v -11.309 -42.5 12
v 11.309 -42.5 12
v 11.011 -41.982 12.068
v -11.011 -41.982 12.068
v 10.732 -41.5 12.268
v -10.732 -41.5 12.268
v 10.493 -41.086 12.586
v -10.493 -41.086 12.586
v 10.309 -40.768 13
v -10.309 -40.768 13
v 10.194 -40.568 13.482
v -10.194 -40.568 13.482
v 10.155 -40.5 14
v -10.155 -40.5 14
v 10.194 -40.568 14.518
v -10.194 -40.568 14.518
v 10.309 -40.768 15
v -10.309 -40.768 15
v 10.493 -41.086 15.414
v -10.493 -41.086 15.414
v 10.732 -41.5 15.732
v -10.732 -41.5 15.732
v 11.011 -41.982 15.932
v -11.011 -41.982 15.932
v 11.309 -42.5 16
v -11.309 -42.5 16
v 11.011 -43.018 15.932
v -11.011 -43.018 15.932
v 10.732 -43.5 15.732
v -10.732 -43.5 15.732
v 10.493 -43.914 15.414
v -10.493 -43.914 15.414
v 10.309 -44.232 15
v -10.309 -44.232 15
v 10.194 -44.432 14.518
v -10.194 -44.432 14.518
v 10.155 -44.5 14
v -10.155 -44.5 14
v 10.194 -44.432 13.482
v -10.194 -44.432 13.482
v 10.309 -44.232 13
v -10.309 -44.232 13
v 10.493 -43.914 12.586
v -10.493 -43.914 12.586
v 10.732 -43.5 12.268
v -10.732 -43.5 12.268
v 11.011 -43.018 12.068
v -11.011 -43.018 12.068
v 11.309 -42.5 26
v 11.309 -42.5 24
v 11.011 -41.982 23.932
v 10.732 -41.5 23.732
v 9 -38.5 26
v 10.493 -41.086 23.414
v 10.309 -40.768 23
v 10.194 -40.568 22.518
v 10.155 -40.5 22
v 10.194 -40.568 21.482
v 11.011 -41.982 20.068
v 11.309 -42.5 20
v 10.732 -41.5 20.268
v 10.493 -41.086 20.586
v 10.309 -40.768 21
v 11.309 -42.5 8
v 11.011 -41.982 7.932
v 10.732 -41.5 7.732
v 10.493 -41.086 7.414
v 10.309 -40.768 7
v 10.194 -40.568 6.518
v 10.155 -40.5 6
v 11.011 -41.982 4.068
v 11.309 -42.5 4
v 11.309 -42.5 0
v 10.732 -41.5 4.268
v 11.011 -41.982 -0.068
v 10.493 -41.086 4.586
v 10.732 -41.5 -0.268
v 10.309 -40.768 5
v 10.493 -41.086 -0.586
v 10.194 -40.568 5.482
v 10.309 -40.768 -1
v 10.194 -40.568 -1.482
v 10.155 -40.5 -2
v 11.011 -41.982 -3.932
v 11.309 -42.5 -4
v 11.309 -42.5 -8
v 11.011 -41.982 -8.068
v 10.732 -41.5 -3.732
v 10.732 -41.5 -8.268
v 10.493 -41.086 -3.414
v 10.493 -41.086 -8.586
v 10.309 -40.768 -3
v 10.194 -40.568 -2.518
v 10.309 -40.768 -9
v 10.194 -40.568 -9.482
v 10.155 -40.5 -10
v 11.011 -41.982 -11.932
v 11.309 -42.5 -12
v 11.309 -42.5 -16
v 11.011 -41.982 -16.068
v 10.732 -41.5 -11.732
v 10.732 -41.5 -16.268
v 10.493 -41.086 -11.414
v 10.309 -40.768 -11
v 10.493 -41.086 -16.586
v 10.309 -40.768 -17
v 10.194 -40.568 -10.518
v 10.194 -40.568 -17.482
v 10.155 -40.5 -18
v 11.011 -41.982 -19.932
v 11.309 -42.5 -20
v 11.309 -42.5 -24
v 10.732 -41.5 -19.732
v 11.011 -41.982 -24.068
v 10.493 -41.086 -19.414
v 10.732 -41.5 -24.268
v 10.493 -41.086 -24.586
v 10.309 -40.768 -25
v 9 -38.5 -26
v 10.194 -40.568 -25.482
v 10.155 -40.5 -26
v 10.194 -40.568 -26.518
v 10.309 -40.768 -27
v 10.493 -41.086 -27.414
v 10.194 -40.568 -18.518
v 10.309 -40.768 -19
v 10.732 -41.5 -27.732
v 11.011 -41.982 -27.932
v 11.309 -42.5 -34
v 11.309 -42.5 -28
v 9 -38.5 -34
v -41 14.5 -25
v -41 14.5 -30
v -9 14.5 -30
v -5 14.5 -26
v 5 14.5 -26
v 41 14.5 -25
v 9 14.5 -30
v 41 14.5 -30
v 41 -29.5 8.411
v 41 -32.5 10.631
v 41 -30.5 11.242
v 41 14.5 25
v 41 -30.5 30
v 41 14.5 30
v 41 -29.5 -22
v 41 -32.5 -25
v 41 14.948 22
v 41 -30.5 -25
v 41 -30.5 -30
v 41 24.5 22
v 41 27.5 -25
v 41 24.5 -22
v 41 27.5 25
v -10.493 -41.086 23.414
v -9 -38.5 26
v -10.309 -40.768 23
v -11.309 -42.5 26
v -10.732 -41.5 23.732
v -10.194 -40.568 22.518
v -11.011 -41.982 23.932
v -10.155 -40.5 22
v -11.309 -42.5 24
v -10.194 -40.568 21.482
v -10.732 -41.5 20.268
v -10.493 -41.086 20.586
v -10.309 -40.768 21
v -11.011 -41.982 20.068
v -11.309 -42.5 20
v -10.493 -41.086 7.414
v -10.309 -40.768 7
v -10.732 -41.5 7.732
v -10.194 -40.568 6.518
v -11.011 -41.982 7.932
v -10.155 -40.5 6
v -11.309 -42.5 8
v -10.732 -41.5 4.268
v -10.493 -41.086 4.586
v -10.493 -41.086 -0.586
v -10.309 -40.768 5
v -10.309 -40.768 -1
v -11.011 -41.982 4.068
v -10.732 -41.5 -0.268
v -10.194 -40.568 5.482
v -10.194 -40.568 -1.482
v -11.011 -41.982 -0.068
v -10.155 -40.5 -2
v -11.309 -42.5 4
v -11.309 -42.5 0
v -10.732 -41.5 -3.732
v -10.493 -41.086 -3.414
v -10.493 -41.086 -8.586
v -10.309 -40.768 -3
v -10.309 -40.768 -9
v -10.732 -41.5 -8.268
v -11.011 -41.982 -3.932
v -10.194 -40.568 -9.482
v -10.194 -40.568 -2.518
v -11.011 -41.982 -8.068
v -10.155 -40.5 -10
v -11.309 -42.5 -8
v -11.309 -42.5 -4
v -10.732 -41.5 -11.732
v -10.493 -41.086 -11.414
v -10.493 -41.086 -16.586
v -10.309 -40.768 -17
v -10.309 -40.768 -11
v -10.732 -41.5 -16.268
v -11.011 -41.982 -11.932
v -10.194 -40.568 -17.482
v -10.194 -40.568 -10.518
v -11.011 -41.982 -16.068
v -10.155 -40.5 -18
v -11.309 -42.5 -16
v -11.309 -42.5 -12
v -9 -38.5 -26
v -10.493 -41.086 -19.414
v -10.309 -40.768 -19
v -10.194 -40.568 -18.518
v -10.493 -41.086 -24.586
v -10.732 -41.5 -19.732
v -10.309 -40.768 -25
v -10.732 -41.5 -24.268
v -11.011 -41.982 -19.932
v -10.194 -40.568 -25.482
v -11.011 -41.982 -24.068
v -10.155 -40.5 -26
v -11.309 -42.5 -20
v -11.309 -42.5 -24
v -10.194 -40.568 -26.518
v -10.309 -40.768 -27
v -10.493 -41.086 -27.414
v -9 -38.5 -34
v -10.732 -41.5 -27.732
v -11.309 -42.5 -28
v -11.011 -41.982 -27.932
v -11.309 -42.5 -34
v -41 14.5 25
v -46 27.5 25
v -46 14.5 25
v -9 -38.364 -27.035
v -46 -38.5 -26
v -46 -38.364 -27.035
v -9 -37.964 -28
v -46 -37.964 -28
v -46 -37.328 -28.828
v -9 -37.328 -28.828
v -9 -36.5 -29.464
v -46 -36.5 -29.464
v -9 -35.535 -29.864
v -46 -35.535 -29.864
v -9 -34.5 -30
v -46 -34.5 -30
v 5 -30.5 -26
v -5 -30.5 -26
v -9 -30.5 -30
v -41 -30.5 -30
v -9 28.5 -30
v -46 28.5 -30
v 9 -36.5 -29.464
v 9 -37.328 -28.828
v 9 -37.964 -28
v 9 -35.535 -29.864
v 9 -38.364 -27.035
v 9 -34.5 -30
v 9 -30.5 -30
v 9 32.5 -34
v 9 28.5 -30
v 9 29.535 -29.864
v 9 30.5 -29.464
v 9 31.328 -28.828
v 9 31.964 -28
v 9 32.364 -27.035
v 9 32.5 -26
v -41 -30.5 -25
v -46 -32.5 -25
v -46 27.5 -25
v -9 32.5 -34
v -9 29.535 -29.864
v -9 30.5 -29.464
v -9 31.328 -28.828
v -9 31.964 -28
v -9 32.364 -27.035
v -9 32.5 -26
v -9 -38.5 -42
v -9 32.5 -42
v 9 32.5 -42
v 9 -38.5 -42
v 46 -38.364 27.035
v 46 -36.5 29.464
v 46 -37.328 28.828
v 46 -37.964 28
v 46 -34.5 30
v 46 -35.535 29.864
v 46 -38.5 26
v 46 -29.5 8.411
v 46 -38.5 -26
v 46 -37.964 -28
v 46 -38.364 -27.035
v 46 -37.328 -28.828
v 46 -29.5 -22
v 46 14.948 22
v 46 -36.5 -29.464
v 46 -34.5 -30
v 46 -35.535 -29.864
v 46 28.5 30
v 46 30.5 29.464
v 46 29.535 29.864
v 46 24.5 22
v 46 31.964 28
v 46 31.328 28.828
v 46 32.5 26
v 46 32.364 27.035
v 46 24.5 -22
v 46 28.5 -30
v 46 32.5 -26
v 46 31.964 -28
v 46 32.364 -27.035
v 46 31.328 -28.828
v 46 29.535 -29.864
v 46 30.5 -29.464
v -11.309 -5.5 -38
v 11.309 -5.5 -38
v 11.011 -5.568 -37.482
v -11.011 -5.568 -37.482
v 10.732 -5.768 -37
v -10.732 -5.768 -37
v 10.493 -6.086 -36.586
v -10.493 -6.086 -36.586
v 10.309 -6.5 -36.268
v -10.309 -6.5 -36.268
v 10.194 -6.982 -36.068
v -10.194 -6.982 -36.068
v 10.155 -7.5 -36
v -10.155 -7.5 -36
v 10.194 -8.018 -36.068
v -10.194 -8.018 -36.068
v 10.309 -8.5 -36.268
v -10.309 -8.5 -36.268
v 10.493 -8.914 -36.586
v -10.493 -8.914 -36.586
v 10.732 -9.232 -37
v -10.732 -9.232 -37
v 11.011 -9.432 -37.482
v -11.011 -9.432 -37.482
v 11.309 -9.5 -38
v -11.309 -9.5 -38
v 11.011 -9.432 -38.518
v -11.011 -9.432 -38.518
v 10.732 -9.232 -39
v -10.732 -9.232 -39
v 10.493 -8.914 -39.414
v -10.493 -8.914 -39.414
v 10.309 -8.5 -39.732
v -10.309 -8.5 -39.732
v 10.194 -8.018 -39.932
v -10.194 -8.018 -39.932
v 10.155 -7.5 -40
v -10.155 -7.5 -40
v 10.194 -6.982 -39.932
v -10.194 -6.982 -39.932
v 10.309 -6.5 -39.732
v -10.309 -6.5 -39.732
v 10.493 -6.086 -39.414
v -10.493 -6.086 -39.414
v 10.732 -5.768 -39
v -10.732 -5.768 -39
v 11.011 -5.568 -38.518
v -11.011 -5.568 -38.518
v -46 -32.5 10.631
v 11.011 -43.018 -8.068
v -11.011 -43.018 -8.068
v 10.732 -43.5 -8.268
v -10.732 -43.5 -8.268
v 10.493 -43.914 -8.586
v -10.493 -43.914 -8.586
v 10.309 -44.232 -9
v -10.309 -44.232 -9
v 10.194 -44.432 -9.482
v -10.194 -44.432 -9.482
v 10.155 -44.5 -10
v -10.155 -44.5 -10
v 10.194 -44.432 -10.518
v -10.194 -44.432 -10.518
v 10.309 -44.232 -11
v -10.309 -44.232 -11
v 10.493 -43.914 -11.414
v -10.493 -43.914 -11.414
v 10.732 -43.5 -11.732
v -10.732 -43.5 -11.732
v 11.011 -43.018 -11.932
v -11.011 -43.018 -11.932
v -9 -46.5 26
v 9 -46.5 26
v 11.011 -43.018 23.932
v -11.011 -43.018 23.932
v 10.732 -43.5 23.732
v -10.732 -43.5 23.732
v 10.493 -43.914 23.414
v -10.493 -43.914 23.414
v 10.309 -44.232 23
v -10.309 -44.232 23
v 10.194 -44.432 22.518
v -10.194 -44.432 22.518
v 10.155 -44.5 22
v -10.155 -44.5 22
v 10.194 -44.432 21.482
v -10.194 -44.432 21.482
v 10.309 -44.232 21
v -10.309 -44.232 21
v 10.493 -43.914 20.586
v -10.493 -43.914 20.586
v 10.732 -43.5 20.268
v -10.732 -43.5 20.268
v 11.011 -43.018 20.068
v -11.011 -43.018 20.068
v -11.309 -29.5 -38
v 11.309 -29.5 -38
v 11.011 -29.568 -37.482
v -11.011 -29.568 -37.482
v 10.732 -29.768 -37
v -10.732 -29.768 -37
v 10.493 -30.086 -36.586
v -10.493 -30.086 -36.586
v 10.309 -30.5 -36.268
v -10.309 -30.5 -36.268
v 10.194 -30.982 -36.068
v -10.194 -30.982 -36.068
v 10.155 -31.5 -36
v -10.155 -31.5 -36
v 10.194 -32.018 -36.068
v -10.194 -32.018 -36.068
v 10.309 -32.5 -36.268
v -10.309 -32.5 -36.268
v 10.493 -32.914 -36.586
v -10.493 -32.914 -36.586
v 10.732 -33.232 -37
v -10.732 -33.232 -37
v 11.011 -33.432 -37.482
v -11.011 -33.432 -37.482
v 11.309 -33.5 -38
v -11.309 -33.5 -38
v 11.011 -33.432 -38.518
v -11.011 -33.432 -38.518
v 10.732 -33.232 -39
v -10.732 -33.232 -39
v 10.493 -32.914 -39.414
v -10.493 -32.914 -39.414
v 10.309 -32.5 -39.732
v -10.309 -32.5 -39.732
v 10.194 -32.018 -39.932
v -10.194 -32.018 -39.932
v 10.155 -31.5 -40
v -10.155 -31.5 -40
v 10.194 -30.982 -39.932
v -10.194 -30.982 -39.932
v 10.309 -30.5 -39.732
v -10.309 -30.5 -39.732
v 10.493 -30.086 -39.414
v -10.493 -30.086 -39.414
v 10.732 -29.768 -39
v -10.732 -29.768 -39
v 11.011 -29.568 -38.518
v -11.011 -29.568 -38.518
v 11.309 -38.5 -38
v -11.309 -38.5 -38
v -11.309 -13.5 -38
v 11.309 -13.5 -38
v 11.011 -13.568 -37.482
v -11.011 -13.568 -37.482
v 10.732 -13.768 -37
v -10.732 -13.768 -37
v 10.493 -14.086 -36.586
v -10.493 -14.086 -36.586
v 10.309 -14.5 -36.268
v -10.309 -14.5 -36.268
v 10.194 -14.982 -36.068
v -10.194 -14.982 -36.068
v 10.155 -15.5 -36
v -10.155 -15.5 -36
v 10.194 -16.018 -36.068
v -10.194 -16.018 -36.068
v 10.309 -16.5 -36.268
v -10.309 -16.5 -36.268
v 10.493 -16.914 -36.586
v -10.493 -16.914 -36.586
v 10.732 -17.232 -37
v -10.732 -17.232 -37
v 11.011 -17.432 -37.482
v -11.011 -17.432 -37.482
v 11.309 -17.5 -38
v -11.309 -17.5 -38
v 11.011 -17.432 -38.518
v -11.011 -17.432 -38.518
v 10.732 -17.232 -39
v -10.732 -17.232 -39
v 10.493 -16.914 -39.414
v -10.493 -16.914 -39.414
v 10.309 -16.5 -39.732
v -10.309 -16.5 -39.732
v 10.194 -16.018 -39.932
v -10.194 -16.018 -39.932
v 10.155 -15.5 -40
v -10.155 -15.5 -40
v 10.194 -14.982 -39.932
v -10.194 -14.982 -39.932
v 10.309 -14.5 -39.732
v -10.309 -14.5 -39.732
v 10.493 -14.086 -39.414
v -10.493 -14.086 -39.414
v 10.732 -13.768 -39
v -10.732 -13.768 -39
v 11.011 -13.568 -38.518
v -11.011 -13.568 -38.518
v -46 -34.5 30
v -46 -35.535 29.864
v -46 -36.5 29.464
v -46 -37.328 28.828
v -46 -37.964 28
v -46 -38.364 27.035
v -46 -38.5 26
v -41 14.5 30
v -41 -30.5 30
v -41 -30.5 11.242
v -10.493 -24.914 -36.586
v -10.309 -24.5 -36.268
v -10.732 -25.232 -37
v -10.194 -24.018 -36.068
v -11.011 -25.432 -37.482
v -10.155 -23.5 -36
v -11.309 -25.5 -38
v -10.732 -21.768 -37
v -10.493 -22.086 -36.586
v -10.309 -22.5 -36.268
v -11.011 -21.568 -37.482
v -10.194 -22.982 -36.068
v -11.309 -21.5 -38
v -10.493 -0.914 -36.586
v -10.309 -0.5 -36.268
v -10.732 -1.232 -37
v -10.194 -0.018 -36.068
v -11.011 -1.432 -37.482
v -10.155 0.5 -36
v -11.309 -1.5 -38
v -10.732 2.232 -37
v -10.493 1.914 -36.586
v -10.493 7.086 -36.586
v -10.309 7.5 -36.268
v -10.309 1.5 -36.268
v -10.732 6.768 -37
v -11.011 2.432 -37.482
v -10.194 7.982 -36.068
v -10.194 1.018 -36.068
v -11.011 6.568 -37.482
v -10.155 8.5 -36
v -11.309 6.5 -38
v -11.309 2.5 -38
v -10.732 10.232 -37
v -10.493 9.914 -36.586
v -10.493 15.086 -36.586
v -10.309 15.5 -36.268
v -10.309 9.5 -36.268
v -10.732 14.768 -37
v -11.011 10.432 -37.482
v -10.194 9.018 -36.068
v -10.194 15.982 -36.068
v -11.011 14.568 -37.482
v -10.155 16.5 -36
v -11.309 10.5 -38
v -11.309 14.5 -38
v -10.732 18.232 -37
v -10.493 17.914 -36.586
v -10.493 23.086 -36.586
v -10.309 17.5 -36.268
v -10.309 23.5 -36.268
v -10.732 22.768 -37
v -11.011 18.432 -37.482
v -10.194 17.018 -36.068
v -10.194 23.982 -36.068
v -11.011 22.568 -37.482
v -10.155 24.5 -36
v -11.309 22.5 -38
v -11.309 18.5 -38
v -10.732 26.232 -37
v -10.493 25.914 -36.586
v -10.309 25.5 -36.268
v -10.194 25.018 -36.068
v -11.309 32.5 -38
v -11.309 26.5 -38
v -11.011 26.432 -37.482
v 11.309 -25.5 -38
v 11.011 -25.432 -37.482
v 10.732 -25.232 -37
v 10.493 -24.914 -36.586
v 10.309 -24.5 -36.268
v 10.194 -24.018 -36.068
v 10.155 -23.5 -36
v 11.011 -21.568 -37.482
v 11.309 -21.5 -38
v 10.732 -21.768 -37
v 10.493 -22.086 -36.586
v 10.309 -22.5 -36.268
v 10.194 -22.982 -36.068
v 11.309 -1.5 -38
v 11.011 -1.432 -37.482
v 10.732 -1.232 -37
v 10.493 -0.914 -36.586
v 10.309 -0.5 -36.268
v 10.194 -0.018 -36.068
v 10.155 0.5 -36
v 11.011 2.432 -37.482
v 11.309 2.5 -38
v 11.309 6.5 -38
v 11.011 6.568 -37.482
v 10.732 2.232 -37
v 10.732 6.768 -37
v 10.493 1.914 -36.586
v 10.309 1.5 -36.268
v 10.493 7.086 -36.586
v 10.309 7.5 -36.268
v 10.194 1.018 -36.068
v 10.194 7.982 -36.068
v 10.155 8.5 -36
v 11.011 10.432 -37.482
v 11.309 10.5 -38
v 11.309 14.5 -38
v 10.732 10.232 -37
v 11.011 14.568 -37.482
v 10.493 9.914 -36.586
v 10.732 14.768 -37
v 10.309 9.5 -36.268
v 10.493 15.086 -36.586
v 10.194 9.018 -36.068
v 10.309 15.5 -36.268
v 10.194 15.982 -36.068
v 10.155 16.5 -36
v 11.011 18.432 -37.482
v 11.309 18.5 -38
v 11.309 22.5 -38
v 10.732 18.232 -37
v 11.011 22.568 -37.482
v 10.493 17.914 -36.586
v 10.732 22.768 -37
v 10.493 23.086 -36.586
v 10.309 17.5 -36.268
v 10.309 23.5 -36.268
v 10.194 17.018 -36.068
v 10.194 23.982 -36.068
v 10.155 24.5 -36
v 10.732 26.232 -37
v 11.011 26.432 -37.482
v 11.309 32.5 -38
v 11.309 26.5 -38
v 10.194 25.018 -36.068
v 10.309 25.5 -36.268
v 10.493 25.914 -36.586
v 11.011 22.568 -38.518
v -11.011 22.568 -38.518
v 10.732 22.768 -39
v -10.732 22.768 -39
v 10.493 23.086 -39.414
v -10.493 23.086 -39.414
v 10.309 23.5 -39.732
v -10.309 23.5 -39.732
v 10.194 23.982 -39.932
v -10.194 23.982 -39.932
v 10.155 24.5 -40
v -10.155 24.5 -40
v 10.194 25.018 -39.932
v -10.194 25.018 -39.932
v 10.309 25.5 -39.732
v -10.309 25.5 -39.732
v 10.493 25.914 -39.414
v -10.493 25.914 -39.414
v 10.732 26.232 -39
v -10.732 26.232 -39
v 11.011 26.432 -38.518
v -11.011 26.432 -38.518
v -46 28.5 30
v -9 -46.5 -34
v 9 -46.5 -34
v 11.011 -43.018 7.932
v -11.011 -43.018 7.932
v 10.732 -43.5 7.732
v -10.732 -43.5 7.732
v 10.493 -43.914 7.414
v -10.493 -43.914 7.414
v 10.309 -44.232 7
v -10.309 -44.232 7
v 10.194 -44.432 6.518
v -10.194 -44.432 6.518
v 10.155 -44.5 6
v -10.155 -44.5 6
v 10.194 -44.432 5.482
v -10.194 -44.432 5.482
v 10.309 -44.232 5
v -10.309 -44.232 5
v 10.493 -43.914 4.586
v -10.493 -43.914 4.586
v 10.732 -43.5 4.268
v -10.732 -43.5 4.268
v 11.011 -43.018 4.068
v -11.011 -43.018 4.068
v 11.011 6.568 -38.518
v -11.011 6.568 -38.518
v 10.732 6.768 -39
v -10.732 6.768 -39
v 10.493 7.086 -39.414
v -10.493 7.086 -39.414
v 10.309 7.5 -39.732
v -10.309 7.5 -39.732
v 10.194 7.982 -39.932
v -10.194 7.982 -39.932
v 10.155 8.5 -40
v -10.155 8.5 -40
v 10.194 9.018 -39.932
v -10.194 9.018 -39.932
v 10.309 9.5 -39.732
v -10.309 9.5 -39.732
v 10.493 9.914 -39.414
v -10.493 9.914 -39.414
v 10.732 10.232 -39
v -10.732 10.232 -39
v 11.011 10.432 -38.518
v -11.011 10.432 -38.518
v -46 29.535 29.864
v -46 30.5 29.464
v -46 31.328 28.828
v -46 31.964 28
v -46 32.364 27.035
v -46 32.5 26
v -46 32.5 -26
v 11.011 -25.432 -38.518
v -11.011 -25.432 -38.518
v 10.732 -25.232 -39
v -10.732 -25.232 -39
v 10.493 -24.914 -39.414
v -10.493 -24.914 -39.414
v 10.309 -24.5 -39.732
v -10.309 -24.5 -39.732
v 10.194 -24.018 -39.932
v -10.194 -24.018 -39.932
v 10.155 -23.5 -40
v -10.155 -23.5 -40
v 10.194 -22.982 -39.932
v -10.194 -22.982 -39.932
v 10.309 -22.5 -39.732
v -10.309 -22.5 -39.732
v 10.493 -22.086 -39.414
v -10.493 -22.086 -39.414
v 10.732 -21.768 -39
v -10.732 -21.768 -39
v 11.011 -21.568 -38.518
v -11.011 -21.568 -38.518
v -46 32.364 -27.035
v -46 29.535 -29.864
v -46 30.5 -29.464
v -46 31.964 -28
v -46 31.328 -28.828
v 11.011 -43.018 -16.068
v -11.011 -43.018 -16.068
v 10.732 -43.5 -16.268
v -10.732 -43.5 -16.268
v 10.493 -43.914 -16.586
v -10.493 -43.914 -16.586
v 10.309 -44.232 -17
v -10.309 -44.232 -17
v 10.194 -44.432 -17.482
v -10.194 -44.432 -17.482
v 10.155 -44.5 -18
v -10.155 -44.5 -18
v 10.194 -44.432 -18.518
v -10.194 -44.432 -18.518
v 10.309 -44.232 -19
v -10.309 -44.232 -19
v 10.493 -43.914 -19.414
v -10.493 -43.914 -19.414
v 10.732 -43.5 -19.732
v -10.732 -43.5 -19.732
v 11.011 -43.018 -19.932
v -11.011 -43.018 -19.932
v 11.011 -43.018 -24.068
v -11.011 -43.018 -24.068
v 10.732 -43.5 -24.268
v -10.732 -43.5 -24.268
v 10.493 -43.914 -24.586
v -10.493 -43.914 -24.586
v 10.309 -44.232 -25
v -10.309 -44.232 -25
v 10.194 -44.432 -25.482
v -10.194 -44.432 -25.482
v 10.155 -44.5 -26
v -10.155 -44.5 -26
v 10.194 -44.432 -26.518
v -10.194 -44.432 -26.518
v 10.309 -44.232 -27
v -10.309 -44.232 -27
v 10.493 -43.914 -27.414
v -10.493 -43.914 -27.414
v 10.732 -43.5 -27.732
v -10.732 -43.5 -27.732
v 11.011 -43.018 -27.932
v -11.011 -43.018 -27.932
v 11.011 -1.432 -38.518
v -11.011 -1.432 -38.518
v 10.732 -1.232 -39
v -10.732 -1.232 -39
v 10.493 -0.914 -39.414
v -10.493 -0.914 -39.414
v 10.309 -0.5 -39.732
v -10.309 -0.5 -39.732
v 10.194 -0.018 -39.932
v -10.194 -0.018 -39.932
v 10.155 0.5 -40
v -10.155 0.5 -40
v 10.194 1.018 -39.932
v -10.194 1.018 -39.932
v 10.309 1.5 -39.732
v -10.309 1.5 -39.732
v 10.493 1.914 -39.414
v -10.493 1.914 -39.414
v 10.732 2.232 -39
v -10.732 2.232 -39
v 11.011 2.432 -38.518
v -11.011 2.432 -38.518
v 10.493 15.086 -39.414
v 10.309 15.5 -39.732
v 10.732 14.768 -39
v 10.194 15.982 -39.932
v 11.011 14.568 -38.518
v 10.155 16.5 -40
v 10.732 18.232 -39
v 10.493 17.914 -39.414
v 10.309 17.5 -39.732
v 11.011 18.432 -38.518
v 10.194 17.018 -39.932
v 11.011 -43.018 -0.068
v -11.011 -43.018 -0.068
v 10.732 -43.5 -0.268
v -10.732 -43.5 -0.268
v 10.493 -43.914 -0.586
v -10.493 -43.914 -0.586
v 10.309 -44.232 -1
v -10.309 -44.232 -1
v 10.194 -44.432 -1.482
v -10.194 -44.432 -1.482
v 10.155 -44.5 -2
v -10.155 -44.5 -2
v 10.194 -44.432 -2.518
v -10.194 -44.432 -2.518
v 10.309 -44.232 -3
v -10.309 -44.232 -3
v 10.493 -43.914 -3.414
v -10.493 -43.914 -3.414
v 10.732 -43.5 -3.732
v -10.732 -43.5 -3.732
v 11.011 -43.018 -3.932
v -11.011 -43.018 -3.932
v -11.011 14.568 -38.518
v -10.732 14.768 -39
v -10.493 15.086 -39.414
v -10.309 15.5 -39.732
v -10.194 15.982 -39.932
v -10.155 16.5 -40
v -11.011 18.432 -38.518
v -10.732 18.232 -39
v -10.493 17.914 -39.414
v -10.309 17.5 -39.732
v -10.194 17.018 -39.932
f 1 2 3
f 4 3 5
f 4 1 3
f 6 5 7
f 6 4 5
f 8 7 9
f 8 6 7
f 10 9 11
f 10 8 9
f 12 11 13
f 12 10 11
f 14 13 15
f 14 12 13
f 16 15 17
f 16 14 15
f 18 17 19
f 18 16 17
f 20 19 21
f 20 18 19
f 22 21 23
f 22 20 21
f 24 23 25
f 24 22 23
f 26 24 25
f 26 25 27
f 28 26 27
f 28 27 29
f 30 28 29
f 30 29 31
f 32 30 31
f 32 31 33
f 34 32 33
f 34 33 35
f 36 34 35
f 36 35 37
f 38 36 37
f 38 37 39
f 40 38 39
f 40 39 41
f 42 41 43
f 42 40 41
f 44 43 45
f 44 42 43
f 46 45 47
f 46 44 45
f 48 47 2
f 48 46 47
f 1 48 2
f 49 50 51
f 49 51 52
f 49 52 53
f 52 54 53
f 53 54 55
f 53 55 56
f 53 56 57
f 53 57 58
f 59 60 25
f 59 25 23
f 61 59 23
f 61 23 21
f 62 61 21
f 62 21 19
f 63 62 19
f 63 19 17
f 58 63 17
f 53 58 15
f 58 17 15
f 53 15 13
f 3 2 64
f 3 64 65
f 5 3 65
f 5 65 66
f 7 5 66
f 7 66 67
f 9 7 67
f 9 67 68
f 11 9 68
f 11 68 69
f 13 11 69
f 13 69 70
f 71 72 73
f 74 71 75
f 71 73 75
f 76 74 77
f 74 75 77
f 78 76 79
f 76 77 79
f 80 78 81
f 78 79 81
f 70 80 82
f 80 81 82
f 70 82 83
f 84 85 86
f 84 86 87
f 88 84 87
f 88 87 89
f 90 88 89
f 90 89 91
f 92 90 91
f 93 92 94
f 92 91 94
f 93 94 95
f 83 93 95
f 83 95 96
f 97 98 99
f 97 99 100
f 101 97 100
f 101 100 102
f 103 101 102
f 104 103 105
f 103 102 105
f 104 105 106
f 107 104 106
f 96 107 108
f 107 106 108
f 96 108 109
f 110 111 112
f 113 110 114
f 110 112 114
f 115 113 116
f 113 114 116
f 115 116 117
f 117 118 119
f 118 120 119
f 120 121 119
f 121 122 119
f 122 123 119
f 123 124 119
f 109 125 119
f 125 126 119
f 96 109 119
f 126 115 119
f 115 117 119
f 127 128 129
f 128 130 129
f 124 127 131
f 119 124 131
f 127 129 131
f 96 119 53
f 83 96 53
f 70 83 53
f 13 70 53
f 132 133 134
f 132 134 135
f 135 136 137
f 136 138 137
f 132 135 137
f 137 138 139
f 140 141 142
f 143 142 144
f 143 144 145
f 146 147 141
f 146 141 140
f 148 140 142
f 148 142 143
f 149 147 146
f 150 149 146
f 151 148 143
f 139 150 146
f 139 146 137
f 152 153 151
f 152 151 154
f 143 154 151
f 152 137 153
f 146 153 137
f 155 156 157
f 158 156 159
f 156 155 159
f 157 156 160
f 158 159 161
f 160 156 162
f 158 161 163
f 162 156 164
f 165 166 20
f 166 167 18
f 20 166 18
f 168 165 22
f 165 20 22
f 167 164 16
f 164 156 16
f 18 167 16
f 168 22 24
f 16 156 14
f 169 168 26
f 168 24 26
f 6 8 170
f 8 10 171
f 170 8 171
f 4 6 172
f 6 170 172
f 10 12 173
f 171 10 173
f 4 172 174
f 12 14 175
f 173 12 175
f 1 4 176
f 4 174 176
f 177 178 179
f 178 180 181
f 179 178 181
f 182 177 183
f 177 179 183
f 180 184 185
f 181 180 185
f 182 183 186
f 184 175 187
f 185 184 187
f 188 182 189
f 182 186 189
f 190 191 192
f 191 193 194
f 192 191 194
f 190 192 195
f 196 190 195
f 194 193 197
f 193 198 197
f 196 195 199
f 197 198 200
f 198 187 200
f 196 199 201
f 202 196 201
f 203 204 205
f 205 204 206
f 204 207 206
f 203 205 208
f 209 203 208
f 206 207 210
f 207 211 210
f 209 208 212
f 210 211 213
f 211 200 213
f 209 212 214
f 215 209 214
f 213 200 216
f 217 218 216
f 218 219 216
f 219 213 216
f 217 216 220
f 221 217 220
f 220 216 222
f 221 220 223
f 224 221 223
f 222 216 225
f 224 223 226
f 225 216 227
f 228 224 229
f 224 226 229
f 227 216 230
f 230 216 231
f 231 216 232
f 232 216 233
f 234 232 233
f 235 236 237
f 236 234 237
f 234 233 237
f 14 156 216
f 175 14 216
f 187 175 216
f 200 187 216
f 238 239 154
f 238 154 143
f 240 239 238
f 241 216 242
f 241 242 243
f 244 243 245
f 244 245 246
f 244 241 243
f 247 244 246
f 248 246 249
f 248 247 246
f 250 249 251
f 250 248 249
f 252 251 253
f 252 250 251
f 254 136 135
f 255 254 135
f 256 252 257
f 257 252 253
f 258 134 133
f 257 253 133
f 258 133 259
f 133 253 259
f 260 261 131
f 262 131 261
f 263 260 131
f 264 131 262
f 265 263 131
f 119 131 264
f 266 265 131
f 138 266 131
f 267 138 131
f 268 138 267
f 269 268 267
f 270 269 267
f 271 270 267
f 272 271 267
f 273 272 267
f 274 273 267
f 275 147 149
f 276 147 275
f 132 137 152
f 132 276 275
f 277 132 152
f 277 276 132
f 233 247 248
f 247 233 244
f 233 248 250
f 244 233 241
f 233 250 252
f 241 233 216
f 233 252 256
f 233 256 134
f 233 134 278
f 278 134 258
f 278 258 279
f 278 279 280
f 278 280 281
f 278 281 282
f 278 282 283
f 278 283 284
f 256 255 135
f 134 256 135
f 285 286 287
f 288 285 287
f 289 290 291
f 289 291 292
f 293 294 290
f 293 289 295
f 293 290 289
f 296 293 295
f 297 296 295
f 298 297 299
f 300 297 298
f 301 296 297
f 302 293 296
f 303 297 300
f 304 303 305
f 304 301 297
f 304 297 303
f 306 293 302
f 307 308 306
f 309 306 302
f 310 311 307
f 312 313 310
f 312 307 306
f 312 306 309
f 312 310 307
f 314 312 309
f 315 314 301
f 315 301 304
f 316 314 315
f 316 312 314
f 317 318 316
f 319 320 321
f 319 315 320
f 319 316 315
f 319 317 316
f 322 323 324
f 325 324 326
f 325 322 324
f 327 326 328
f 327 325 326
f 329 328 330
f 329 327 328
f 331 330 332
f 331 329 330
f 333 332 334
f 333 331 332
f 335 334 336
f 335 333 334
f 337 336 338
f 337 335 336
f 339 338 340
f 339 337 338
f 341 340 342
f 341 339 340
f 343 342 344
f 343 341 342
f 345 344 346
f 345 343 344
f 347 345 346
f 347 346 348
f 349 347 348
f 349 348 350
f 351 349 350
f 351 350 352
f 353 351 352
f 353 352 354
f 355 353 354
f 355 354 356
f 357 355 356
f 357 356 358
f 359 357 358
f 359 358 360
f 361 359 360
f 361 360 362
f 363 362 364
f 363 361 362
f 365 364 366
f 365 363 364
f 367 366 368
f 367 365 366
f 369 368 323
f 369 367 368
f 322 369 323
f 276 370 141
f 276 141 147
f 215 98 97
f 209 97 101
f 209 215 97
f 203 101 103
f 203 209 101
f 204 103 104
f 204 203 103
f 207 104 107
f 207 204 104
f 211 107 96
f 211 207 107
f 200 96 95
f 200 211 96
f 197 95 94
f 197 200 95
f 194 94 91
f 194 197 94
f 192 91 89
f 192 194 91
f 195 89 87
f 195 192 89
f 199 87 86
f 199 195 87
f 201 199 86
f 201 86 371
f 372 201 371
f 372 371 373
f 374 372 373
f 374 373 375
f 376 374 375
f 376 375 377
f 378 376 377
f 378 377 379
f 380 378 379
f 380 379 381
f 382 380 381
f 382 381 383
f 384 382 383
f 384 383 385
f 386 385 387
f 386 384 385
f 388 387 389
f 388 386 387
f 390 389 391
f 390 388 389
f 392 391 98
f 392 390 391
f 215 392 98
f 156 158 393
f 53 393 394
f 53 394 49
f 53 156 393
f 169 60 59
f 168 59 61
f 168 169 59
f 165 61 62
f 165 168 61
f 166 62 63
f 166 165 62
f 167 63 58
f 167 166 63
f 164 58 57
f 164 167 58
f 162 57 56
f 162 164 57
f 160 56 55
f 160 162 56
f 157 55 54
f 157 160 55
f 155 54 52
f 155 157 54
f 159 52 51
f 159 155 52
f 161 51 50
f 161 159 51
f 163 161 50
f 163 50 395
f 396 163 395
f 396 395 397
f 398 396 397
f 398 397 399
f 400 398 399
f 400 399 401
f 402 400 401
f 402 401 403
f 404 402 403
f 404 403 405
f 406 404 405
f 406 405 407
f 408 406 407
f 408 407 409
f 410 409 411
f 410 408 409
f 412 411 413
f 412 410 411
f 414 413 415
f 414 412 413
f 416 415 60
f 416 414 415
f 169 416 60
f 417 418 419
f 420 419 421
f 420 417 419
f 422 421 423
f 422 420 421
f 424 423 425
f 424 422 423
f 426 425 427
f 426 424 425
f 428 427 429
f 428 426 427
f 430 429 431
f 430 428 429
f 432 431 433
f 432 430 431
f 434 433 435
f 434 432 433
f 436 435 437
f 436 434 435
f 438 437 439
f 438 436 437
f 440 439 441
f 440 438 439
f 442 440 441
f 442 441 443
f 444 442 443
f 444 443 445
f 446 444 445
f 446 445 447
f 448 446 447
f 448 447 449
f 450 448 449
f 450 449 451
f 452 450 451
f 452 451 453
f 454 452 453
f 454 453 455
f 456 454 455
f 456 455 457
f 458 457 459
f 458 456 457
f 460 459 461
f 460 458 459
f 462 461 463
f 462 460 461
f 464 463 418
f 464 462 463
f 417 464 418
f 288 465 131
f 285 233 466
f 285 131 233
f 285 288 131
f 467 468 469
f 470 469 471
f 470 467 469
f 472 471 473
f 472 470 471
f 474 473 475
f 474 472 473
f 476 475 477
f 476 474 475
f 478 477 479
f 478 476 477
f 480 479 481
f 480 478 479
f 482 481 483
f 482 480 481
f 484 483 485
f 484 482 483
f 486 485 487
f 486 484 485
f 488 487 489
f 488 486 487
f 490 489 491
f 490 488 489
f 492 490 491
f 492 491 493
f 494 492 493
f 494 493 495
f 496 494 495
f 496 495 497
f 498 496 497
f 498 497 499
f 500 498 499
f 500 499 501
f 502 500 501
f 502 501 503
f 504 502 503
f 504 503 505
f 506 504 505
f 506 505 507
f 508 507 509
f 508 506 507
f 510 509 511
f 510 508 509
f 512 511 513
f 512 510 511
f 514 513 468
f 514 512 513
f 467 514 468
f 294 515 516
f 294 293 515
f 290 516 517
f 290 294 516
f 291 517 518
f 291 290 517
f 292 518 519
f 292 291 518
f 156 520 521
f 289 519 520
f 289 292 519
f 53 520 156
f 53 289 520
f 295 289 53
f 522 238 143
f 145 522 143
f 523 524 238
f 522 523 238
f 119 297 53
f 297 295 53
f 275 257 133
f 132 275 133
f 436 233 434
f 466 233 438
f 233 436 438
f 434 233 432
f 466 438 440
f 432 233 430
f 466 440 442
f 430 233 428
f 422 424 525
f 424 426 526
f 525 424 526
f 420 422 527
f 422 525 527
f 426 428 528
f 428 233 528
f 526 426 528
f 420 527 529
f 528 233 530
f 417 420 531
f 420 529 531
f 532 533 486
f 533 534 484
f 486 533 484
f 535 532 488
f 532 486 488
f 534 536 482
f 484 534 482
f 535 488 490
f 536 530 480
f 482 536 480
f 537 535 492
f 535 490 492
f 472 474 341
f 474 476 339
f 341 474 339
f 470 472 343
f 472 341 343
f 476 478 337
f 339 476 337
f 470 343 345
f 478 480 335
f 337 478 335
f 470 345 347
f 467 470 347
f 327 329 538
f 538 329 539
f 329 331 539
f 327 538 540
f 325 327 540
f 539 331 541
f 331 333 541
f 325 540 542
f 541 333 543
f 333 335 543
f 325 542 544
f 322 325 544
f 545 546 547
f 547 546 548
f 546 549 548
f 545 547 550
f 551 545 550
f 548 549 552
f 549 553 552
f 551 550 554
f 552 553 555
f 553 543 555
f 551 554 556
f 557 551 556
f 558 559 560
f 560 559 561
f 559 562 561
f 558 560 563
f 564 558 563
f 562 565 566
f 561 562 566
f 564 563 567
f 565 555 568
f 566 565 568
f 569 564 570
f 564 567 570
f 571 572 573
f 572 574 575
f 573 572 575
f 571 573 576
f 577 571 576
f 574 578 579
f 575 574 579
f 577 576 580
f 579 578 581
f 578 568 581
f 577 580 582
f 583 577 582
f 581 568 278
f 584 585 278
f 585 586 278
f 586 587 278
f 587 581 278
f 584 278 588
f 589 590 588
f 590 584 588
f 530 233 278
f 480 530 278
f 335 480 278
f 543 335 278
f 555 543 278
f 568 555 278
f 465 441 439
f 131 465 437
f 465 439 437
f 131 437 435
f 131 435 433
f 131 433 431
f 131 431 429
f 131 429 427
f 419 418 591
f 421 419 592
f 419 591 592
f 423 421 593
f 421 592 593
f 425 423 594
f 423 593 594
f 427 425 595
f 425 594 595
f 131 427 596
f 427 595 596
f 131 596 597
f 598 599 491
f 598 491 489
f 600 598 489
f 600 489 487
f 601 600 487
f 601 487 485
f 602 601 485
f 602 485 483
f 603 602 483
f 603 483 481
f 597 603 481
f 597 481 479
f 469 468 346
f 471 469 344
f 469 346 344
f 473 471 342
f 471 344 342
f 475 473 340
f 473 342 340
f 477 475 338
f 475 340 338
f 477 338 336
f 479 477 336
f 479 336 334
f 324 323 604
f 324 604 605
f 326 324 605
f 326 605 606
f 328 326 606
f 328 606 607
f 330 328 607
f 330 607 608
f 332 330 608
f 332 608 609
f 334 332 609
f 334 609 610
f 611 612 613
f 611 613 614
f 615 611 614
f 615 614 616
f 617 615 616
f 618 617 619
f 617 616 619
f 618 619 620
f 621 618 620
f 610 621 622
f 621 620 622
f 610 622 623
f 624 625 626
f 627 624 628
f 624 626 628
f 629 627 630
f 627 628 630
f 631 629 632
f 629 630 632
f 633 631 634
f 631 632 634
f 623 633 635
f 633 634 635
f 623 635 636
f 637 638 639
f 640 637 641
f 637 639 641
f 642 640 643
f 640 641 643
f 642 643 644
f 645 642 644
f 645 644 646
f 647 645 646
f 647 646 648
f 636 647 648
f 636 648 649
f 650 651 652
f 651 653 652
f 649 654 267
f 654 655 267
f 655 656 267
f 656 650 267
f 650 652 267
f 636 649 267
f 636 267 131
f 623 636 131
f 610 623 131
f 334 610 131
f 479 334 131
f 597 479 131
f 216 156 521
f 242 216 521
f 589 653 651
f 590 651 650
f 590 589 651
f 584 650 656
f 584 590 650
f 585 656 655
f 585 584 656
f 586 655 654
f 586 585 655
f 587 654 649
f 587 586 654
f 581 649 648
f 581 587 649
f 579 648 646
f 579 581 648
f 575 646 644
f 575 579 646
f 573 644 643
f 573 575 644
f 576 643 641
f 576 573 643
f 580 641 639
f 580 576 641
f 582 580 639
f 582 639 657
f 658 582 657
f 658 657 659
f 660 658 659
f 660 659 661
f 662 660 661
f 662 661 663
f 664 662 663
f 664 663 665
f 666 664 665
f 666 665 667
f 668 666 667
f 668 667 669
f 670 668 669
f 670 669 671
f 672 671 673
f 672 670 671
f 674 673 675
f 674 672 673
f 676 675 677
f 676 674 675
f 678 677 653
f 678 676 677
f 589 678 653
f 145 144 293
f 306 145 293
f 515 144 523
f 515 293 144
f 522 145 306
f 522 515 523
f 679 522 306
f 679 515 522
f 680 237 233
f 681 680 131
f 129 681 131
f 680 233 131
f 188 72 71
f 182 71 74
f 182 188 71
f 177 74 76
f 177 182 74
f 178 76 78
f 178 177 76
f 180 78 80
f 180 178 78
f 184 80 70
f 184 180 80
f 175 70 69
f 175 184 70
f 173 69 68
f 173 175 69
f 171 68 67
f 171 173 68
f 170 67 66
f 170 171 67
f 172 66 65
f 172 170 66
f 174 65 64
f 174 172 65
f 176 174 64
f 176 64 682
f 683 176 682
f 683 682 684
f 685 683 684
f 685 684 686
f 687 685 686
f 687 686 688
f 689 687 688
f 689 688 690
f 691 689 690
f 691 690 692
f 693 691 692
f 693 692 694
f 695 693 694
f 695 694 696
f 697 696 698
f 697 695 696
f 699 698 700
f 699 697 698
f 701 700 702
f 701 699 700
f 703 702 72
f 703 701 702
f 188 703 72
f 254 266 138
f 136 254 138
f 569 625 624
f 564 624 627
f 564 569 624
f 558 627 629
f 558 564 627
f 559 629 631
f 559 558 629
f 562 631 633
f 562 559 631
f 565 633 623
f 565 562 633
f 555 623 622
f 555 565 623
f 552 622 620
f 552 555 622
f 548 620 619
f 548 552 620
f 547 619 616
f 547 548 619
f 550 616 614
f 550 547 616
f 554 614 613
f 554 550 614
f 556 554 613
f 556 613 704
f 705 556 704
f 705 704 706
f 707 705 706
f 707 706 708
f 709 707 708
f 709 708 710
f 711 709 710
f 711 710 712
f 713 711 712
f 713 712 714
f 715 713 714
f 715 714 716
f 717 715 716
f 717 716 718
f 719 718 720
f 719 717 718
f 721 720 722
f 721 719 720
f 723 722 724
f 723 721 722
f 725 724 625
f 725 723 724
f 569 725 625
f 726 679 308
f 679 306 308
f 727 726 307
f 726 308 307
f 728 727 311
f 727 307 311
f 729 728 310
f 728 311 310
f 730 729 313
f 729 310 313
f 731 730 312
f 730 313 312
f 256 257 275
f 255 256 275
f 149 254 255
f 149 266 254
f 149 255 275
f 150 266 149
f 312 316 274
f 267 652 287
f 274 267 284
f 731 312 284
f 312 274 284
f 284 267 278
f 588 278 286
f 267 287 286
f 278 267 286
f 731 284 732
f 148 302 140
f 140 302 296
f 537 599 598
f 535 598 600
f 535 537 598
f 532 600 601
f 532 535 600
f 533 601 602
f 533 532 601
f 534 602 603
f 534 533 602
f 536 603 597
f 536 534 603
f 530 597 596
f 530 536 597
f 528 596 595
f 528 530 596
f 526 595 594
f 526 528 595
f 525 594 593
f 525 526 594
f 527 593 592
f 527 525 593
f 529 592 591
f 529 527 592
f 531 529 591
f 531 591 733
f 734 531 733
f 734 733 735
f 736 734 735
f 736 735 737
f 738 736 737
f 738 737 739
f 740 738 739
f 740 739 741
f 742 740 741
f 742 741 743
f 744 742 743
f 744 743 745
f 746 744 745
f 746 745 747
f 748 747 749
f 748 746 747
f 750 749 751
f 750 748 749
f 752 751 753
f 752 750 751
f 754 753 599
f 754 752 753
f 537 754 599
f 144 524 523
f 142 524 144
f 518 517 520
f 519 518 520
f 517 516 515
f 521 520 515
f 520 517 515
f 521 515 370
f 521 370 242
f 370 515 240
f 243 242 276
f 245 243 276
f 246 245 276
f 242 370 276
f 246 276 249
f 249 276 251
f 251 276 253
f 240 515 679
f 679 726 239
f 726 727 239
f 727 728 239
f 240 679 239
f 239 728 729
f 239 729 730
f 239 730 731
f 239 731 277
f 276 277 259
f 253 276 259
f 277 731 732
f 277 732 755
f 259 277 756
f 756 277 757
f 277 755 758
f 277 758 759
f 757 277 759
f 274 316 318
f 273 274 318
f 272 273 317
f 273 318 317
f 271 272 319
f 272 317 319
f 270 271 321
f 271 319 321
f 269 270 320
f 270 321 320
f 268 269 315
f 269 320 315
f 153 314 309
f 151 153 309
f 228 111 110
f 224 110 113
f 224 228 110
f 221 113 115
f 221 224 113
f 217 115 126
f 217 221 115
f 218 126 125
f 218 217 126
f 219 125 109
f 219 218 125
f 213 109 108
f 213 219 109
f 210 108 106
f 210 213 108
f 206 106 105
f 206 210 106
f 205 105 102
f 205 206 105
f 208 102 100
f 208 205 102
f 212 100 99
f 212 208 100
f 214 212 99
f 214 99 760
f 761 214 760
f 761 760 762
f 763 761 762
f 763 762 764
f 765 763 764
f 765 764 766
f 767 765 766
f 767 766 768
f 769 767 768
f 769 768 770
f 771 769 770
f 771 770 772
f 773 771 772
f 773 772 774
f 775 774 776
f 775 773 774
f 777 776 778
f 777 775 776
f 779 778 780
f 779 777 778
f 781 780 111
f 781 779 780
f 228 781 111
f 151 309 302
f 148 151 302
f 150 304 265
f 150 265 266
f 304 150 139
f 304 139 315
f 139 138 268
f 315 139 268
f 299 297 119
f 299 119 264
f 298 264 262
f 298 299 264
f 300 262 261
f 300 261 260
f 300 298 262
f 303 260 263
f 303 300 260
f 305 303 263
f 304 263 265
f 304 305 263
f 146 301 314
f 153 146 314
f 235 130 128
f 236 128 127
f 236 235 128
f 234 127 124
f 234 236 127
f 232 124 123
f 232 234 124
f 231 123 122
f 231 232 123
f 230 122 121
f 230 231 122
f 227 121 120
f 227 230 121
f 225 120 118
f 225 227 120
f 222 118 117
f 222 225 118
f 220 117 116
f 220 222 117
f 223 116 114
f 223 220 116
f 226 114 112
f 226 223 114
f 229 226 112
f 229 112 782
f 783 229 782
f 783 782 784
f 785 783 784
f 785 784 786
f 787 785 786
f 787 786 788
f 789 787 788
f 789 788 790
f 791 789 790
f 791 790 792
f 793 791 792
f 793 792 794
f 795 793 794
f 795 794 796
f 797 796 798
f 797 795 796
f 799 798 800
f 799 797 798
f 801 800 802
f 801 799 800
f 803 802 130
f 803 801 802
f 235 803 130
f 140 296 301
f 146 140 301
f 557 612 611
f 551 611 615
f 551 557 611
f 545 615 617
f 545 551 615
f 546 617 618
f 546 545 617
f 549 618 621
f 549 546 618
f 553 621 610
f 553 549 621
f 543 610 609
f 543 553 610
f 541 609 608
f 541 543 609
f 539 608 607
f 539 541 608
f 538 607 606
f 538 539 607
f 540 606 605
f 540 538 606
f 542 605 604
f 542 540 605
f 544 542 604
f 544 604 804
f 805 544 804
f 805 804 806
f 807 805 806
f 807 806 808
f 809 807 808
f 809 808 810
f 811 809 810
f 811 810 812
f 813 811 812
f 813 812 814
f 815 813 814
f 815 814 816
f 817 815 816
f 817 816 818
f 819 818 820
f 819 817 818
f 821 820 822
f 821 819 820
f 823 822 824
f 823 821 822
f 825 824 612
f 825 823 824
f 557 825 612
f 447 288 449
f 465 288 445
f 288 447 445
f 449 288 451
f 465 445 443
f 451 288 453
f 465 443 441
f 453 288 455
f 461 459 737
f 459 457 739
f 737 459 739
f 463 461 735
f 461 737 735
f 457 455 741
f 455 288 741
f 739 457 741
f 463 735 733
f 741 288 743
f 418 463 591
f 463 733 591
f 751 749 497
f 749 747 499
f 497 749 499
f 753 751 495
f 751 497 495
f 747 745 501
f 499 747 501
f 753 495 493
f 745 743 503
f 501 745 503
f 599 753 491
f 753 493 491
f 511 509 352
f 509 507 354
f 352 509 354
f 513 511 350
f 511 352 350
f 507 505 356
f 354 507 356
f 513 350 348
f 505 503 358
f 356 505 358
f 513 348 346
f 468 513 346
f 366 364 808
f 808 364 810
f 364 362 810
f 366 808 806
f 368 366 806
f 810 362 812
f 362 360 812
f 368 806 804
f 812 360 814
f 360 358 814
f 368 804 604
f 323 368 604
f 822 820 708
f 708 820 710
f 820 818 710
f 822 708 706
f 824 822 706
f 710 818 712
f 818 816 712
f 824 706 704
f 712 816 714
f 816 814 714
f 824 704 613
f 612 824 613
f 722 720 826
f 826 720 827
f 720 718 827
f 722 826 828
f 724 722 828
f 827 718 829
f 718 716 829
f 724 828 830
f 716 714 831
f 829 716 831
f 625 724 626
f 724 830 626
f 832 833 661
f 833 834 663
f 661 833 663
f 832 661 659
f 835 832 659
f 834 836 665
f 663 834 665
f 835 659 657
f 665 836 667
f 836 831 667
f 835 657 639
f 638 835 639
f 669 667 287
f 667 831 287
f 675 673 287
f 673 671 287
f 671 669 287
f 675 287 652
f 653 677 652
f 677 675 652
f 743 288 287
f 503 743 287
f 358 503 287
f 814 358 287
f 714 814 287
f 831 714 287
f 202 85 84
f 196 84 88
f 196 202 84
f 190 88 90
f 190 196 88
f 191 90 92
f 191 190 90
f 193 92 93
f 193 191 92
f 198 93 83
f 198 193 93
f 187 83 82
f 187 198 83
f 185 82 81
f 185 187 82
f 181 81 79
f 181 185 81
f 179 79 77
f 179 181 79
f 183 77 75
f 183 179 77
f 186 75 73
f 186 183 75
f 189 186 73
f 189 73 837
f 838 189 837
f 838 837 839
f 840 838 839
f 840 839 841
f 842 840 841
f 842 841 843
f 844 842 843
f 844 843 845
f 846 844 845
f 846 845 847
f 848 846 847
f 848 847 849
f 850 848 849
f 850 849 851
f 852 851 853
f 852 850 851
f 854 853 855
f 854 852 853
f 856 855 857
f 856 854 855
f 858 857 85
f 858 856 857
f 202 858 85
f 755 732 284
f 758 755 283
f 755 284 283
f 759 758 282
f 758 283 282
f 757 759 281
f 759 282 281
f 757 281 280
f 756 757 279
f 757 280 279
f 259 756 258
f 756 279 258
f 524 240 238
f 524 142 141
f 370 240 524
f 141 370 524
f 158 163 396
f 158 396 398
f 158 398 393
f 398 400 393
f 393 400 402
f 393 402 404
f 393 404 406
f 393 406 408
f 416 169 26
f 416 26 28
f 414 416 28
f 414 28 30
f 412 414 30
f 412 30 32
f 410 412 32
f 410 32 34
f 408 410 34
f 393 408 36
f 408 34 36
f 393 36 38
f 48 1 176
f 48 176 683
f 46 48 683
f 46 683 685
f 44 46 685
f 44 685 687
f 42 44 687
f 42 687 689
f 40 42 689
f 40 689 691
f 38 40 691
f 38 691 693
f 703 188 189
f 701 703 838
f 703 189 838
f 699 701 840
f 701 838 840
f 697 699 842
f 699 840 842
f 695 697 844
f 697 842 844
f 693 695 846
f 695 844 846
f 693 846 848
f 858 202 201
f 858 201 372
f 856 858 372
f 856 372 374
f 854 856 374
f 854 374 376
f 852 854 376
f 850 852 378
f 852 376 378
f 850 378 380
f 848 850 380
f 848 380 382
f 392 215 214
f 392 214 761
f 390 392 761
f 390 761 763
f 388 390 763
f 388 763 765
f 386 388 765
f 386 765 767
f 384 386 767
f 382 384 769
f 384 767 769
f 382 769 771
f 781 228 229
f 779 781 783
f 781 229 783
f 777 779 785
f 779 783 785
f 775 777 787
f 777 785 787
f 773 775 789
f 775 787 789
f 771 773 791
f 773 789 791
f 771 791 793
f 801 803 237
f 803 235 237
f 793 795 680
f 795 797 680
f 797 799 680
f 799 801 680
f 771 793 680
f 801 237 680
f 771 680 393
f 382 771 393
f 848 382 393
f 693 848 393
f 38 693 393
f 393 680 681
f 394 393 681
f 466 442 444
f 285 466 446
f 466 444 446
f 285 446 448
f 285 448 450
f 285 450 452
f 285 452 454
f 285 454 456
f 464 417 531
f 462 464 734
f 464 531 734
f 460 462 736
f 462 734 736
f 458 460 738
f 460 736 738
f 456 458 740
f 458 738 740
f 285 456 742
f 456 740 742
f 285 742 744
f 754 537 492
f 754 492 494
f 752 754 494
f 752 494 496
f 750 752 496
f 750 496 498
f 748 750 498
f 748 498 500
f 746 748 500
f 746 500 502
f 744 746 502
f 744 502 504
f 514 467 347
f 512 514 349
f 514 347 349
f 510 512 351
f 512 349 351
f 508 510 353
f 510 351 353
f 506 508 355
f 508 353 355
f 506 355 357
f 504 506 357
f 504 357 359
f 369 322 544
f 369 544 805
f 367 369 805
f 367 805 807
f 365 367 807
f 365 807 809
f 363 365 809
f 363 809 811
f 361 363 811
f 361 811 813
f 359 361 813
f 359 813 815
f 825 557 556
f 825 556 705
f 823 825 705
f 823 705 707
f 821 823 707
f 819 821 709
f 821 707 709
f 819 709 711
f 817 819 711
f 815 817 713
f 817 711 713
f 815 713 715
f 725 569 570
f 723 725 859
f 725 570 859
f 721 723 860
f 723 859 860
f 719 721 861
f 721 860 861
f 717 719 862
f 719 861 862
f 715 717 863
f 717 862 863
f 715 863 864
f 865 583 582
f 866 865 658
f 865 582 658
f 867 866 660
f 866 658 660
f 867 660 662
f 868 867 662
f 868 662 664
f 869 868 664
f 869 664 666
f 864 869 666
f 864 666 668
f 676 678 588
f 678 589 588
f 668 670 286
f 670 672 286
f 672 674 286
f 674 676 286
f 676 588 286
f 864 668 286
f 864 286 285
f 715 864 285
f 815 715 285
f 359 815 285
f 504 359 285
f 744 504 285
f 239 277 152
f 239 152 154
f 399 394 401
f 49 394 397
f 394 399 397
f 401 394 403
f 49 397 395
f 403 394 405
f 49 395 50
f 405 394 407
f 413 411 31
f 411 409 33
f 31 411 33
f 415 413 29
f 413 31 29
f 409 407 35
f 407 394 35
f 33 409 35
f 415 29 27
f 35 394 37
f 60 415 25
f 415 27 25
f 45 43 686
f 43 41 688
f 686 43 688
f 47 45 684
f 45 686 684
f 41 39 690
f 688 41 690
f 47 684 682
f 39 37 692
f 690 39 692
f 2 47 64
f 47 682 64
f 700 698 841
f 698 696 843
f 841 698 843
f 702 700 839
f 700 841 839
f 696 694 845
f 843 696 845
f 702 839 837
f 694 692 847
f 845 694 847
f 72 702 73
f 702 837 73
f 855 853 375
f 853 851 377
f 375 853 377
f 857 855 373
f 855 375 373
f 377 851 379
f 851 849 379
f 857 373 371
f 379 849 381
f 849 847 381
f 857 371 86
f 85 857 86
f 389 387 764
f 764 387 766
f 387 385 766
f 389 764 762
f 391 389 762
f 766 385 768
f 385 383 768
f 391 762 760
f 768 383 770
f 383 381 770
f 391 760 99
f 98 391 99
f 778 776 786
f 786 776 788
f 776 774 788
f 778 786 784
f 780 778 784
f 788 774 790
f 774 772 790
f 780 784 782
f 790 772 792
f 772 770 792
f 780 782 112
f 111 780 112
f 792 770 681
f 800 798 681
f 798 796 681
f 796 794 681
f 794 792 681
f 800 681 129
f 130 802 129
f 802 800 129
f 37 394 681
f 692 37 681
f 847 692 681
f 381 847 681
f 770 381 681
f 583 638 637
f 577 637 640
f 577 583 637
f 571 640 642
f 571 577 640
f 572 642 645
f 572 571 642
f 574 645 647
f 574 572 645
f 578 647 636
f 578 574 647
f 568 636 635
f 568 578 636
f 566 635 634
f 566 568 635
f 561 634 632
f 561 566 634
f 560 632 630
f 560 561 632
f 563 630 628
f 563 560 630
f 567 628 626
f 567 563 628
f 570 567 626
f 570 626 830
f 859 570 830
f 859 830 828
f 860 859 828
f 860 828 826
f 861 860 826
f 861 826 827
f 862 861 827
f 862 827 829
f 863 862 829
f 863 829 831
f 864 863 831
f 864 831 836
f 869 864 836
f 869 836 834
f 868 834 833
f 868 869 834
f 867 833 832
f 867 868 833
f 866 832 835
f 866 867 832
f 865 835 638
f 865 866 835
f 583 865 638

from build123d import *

# Parameters (mm, degrees)
BASE_DEPTH               = 46
BASE_DEPTH_BACK          = 46
SKETCH4_W                = 60
SKETCH4_H                = 71
LIDAR_DEPTH              = 41
LIDAR_DEPTH_BACK         = 46
HOLEFRONTBACK_DEPTH      = 68.068994327
HOLEFRONTBACK_DEPTH_BACK = 68.068994327
SKETCH6_W                = 82
SKETCH6_H                = 45
FILLET2_R                = 4
BOSS_EXTRUDE1_DEPTH      = 4
BOSS_EXTRUDE1_DEPTH_BACK = 4
SKETCH11_W               = 18
SKETCH11_H               = 71
BOSS_EXTRUDE3_DEPTH      = 60
BOSS_EXTRUDE4_DEPTH      = 71
CUT_EXTRUDE1_START       = -57.309401
SKETCH14_R               = 2
CUT_EXTRUDE1_DEPTH       = 22.618802
CUT_EXTRUDE2_DEPTH       = 5
CHAMFER1_SIZE            = 4


with BuildPart() as part:
    # Sketch4 → Base (new, two sides: drawn at the far end of the back side and taken through both)
    with BuildSketch(Plane(origin=(0, 0, 0), x_dir=(0, 0, -1), z_dir=(1, 0, 0)).offset(-BASE_DEPTH_BACK)):
        with Locations((0, -3)):
            Rectangle(SKETCH4_W, SKETCH4_H)
    extrude(amount=BASE_DEPTH + BASE_DEPTH_BACK)

    # Sketch5 → LIDAR (cut, two sides: drawn at the far end of the back side and taken through both)
    with BuildSketch(Plane(origin=(0, 0, 0), x_dir=(0, 0, -1), z_dir=(1, 0, 0)).offset(-LIDAR_DEPTH_BACK)):
        Polygon((-25, 27.5), (-25, 14.5), (-10.630657971, -32.5), (25, -32.5), (25, 27.5), align=None)
    extrude(amount=LIDAR_DEPTH + LIDAR_DEPTH_BACK, mode=Mode.SUBTRACT)

    # Sketch6 → HoleFrontBack (cut, two sides: drawn at the far end of the back side and taken through both)
    with BuildSketch(Plane.XY.offset(-HOLEFRONTBACK_DEPTH_BACK)):
        with Locations((0, -8)):
            Rectangle(SKETCH6_W, SKETCH6_H)
    extrude(amount=HOLEFRONTBACK_DEPTH + HOLEFRONTBACK_DEPTH_BACK, mode=Mode.SUBTRACT)

    # Fillet2
    fillet2_edges = [part.edges().sort_by_distance(p)[0] for p in [
        (0, 32.5, 30),
        (0, 32.5, -30),
        (0, -38.5, -30),
        (0, -38.5, 30),
    ]]
    fillet(fillet2_edges, radius=FILLET2_R)

    # Sketch11 → Boss-Extrude1 (add, two sides: drawn at the far end of the back side and taken through both)
    with BuildSketch(Plane(origin=(0, 0, -30), x_dir=(-1, 0, 0), z_dir=(0, 0, -1)).offset(-BOSS_EXTRUDE1_DEPTH_BACK)):
        with Locations((0, -3)):
            Rectangle(SKETCH11_W, SKETCH11_H)
    extrude(amount=BOSS_EXTRUDE1_DEPTH + BOSS_EXTRUDE1_DEPTH_BACK)

    # Sketch13 → Boss-Extrude3 (add)
    with BuildSketch(Plane(origin=(0, 0, -34), x_dir=(-1, 0, 0), z_dir=(0, 0, -1))):
        Polygon((-9, -38.5), (9, -38.5), (11.309401077, -42.5), (9, -46.5), (-9, -46.5), (-11.309401077, -42.5), align=None)
    extrude(amount=-BOSS_EXTRUDE3_DEPTH)

    # Sketch12 → Boss-Extrude4 (add)
    with BuildSketch(Plane(origin=(0, 32.5, 0), x_dir=(1, 0, 0), z_dir=(0, 1, 0))):
        Polygon((-9, 34), (-11.309401077, 38), (-9, 42), (9, 42), (11.309401077, 38), (9, 34), align=None)
    extrude(amount=-BOSS_EXTRUDE4_DEPTH)

    # Sketch14 → Cut-Extrude1 (cut)
    with BuildSketch(Plane(origin=(46, 0, 0), x_dir=(0, 0, -1), z_dir=(1, 0, 0)).offset(CUT_EXTRUDE1_START)):
        with Locations(Location((38, 24.5, 0), (0, 0, 90))):
            Circle(SKETCH14_R)
        with Locations(Location((38, 16.5, 0), (0, 0, 90))):
            Circle(SKETCH14_R)
        with Locations(Location((38, 8.5, 0), (0, 0, 90))):
            Circle(SKETCH14_R)
        with Locations(Location((38, 0.5, 0), (0, 0, 90))):
            Circle(SKETCH14_R)
        with Locations(Location((38, -7.5, 0), (0, 0, 90))):
            Circle(SKETCH14_R)
        with Locations(Location((38, -15.5, 0), (0, 0, 90))):
            Circle(SKETCH14_R)
        with Locations(Location((38, -23.5, 0), (0, 0, 90))):
            Circle(SKETCH14_R)
        with Locations(Location((38, -31.5, 0), (0, 0, 90))):
            Circle(SKETCH14_R)
        with Locations((26, -42.5)):
            Circle(SKETCH14_R)
        with Locations((18, -42.5)):
            Circle(SKETCH14_R)
        with Locations((10, -42.5)):
            Circle(SKETCH14_R)
        with Locations((2, -42.5)):
            Circle(SKETCH14_R)
        with Locations((-6, -42.5)):
            Circle(SKETCH14_R)
        with Locations((-14, -42.5)):
            Circle(SKETCH14_R)
        with Locations((-22, -42.5)):
            Circle(SKETCH14_R)
    extrude(amount=CUT_EXTRUDE1_DEPTH, mode=Mode.SUBTRACT)

    # Sketch15 → Cut-Extrude2 (cut)
    with BuildSketch(Plane(origin=(46, 0, 0), x_dir=(0, 0, -1), z_dir=(1, 0, 0))):
        Polygon((-22, 14.948353004), (-8.410774746, -29.5), (22, -29.5), (22, 14.641172912), (22, 24.5), (-22, 24.5), align=None)
    extrude(amount=-CUT_EXTRUDE2_DEPTH, mode=Mode.SUBTRACT)

    # Chamfer1
    chamfer1_edges = [part.edges().sort_by_distance(p)[0] for p in [
        (9, -8, -26),
        (-9, -8, -26),
    ]]
    chamfer(chamfer1_edges, length=CHAMFER1_SIZE)


solid = part.part
